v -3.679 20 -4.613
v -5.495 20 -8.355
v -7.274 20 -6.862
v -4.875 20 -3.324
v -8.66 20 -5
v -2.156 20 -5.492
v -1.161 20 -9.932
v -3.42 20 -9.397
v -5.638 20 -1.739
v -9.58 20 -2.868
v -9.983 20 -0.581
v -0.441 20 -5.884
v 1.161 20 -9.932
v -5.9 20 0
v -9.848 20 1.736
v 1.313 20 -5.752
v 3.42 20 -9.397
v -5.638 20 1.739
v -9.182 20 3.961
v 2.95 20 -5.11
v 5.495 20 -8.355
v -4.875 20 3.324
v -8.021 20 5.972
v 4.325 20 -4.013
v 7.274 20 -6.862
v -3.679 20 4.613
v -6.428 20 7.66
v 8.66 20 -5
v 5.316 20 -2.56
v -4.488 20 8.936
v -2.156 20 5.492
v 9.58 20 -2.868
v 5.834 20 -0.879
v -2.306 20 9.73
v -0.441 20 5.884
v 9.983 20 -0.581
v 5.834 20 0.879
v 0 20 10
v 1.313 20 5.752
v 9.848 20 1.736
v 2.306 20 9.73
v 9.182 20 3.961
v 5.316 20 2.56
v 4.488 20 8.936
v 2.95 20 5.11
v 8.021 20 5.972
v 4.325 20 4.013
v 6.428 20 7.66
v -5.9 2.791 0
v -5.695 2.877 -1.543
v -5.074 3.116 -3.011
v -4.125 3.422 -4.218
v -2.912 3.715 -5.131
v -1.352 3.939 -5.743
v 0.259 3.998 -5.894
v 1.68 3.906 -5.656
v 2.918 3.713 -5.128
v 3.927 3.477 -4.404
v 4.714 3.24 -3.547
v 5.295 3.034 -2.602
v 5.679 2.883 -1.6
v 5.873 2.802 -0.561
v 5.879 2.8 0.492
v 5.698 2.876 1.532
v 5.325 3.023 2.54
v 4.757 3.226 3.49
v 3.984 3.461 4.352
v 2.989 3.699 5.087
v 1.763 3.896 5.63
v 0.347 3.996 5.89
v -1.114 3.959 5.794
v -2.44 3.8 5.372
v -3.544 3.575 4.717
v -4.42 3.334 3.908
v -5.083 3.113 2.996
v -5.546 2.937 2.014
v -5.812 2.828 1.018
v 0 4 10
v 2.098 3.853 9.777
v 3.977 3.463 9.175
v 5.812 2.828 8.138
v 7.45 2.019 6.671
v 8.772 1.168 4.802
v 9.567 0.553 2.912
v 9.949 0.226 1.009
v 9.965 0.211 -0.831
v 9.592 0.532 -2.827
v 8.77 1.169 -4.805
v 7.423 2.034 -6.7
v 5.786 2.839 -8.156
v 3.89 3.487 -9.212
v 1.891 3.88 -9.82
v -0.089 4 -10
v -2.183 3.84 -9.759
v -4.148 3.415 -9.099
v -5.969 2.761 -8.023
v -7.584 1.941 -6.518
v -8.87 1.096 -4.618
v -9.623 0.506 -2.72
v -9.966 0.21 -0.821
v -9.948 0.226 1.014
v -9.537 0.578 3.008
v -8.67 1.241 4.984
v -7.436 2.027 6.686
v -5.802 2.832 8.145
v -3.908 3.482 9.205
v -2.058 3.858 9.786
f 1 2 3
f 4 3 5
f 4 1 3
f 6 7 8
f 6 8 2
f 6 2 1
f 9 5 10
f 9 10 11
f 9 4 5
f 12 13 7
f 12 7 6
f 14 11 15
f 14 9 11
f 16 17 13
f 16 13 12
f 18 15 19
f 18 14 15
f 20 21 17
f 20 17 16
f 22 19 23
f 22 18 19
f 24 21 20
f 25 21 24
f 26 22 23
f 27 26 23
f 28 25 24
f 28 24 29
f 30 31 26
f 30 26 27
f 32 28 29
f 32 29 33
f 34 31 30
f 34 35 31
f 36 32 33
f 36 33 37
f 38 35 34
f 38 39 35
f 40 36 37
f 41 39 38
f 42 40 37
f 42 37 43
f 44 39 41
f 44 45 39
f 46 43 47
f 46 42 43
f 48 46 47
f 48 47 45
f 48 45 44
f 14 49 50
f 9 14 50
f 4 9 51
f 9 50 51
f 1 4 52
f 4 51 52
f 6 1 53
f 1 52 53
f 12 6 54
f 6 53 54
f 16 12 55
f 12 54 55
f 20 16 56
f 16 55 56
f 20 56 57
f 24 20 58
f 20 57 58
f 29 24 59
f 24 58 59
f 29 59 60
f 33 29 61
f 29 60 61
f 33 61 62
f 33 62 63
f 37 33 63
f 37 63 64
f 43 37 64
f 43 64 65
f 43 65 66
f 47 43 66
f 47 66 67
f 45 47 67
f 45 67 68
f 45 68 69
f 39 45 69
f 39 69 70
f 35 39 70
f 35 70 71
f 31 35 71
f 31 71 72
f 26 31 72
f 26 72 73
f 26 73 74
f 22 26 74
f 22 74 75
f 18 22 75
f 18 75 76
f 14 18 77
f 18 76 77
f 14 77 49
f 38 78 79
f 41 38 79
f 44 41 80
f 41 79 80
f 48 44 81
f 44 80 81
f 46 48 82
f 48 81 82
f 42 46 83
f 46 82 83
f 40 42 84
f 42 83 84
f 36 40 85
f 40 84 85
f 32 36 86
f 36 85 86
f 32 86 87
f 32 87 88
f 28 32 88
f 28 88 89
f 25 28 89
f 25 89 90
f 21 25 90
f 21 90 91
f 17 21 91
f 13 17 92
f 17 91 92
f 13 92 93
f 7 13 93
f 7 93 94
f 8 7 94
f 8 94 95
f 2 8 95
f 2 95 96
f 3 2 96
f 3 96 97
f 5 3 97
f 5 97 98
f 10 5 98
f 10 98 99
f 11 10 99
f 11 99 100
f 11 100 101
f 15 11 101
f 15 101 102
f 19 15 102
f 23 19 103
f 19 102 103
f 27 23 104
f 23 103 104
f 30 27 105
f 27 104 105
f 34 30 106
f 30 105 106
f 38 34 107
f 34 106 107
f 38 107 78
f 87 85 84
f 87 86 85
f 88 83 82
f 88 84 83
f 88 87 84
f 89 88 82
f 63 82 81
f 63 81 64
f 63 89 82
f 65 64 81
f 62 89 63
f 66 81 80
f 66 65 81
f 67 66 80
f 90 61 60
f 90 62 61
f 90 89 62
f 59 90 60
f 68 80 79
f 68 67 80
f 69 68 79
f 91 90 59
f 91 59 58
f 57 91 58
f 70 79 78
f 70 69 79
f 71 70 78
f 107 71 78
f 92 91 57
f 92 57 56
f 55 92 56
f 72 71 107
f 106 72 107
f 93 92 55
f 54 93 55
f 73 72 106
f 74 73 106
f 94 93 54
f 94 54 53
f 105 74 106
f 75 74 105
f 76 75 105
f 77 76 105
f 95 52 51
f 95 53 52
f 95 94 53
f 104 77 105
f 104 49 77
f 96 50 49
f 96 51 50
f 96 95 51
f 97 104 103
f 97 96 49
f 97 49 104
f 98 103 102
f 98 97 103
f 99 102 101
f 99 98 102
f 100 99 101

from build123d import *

# Parameters (mm, degrees)
SKETCH1_R               = 10
BOSS_EXTRUDE1_DEPTH     = 20
CUT_EXTRUDE1_DEPTH      = 25.494897428
CUT_EXTRUDE1_DEPTH_BACK = 25.494897428
SKETCH2_R               = 15
G1_4_TAPPED_HOLE1_D     = 11.8


with BuildPart() as part:
    # Sketch1 → Boss-Extrude1 (new body)
    with BuildSketch(Plane(origin=(0, 0, 0), x_dir=(1, 0, 0), z_dir=(0, 1, 0))):
        with Locations(Location((0, 0, 0), (0, 0, 270))):
            Circle(SKETCH1_R)
    extrude(amount=BOSS_EXTRUDE1_DEPTH)

    # Sketch2 → Cut-Extrude1 (cut, two sides: drawn at the far end of the back side and taken through both)
    with BuildSketch(Plane.XY.offset(-CUT_EXTRUDE1_DEPTH_BACK)):
        with Locations((0, -11)):
            Circle(SKETCH2_R)
    extrude(amount=CUT_EXTRUDE1_DEPTH + CUT_EXTRUDE1_DEPTH_BACK, mode=Mode.SUBTRACT)

    # G1/4 Tapped Hole1 (through all)
    with Locations(Plane(origin=(0, 20, 0), x_dir=(1, 0, 0), z_dir=(0, 1, 0))):
        with Locations((0, 0)):
            Hole(G1_4_TAPPED_HOLE1_D / 2)


solid = part.part
